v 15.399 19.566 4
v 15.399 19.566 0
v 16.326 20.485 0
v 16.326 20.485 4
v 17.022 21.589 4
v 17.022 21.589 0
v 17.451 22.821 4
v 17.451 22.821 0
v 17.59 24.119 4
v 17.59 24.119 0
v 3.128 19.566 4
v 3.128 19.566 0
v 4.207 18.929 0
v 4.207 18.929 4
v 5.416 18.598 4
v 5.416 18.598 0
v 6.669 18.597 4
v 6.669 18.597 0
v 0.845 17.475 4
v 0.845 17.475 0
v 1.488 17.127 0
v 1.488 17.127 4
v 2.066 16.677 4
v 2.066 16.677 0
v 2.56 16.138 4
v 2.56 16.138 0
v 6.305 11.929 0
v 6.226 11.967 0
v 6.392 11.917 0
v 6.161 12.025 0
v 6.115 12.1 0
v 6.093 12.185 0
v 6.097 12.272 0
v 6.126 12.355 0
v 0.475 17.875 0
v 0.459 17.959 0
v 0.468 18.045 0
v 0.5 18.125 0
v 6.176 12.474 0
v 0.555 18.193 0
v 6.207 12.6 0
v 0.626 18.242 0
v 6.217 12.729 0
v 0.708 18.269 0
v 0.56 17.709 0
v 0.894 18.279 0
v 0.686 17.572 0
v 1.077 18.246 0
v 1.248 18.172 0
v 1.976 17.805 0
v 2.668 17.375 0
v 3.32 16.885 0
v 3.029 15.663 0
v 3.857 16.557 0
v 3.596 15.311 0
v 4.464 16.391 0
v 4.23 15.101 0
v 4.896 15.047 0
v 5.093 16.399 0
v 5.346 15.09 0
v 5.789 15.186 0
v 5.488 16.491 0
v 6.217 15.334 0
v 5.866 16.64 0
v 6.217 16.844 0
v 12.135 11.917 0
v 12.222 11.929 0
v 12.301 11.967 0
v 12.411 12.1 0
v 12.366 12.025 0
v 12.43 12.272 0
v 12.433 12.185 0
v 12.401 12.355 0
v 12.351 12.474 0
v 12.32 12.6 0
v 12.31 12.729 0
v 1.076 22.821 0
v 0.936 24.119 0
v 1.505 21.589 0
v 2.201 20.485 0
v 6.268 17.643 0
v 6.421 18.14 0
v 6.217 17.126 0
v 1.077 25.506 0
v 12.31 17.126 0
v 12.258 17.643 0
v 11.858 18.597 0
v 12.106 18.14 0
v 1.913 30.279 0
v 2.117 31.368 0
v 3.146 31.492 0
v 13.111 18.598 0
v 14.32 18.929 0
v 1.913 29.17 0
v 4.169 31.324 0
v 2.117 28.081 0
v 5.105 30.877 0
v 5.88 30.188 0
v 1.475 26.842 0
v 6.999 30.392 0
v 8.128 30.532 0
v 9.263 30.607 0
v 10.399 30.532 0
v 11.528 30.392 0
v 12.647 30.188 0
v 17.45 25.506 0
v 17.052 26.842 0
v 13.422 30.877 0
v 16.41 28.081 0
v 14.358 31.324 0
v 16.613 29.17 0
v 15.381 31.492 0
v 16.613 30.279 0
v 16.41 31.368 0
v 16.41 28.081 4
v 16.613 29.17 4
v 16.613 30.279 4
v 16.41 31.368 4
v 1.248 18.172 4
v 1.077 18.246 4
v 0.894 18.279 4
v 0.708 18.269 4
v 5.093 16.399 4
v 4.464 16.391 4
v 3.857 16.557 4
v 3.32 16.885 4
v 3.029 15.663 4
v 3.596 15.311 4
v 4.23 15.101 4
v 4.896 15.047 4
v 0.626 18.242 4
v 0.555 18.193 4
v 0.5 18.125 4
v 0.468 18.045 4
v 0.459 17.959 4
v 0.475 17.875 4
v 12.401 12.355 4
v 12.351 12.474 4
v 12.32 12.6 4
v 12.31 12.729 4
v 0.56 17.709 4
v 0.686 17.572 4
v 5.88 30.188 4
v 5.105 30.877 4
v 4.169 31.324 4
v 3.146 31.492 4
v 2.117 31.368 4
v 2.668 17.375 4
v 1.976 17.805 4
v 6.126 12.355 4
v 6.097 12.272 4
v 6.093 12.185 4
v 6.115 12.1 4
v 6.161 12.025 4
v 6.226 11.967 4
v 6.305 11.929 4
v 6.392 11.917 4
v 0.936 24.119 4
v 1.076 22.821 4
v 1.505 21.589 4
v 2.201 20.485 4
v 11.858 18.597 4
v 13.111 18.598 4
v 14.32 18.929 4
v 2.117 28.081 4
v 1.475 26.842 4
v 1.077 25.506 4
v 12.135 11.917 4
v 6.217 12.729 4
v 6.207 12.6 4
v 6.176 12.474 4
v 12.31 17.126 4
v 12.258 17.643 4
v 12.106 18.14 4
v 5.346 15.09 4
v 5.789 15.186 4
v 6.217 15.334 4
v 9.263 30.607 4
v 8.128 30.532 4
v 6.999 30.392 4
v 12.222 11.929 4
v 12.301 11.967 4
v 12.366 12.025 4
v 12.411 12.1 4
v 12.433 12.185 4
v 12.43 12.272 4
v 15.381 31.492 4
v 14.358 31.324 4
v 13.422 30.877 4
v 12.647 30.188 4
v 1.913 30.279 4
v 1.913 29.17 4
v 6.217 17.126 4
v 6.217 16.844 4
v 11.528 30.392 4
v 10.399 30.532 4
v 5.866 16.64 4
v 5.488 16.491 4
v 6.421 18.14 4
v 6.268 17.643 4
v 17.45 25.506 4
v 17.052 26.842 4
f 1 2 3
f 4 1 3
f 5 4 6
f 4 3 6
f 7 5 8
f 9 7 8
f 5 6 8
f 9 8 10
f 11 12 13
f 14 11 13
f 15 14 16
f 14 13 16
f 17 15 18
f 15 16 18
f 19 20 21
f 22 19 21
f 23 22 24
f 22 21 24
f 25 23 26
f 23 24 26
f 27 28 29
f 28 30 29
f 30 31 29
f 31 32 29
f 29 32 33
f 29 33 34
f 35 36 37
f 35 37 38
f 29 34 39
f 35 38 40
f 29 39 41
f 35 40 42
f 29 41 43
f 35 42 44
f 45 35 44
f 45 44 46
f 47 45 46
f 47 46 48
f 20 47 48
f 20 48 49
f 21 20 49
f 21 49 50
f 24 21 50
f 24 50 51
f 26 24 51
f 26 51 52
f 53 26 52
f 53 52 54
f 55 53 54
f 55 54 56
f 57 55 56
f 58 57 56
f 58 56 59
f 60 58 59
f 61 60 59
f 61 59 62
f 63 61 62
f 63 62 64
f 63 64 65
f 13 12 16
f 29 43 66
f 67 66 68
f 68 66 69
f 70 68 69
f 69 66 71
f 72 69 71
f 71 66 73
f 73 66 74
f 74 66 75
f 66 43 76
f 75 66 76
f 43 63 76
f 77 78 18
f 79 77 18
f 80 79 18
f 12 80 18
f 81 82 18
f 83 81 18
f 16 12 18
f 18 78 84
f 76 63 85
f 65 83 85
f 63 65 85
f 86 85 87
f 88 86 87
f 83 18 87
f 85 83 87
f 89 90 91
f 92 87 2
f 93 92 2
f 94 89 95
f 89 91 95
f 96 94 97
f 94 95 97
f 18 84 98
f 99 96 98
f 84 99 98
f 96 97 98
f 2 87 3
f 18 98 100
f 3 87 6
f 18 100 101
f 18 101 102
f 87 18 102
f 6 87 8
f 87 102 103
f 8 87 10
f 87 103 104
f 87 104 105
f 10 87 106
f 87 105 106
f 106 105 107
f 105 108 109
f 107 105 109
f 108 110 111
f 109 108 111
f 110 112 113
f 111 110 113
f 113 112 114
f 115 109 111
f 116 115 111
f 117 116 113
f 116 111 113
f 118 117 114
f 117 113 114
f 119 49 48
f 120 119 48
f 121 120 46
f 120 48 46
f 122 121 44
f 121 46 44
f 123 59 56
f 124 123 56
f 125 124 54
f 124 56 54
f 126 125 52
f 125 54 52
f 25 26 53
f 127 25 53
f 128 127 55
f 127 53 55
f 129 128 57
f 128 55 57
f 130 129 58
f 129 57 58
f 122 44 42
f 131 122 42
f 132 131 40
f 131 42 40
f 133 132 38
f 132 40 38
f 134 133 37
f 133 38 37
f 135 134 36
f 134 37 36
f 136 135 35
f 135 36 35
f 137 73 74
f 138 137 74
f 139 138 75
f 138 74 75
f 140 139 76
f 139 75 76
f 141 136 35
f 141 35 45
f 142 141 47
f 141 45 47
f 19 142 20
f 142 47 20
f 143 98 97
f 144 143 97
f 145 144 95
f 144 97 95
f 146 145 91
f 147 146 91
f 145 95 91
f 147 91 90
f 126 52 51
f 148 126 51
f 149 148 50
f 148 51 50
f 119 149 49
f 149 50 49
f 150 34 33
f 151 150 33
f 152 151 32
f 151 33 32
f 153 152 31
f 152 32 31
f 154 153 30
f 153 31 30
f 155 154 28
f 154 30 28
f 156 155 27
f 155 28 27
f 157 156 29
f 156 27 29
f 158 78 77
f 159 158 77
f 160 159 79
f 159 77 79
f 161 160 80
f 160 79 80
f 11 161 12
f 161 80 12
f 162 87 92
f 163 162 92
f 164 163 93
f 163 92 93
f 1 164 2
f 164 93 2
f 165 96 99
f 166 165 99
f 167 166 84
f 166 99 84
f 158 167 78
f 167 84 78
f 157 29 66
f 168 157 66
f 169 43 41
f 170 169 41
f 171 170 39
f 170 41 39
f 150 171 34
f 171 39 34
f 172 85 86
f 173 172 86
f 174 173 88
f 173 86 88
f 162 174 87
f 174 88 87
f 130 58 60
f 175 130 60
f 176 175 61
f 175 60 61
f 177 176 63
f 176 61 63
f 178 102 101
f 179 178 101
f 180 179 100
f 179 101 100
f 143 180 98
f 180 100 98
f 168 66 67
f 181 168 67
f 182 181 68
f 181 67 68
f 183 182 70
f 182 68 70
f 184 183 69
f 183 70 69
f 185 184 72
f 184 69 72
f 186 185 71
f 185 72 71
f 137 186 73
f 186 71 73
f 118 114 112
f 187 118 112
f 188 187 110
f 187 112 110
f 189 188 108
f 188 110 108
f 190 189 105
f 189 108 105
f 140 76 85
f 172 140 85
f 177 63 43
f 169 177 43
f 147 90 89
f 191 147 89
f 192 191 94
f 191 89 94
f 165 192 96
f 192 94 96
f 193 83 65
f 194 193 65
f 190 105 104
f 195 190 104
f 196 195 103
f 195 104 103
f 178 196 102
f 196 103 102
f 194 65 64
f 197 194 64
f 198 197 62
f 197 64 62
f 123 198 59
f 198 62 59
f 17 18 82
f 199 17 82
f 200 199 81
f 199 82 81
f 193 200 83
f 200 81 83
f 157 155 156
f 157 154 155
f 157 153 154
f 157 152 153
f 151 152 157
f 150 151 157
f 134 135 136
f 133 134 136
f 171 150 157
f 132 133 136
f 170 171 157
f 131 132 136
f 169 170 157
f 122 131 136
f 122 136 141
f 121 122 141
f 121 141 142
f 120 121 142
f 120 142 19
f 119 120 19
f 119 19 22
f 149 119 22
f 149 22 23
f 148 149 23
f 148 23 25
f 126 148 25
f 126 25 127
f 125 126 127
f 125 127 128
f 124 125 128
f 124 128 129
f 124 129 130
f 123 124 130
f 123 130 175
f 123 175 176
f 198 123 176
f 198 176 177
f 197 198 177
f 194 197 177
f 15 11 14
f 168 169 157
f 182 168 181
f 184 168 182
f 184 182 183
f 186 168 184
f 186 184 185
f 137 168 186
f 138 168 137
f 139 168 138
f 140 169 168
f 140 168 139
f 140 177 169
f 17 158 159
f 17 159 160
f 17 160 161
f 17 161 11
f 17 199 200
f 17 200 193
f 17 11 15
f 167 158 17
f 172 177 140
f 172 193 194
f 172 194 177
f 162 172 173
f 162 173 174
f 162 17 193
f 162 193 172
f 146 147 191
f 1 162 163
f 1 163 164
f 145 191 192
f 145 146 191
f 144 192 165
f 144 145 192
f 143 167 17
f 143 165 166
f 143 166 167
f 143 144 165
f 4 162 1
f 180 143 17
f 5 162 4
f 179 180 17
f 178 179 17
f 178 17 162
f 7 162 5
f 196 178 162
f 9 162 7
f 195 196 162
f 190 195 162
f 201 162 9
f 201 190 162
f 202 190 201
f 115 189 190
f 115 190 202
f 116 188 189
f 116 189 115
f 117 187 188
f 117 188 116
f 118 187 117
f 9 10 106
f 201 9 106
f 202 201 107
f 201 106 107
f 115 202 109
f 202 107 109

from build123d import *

# Parameters (mm, degrees)
F1_DEPTH    = 4
F3_DEPTH    = 4
F4_T1_DEPTH = 8.9373301178
F4_T3_DEPTH = 5.4979166118


# Not quite as in the source:
# - a fillet or chamfer that OpenCascade refuses, or shapes differently, is made with other operations: its cross-section is extruded or revolved along the edge and cut away or added


with BuildPart() as f1:
    # F0 (on Top) → F1 (new body)
    with BuildSketch(Plane.XY):
        with BuildLine():
            Line((5.4043182717, 11.9166336954), (9.2633608729, 11.9166336954))
            Line((9.2633608729, 11.9166336954), (13.1224034741, 11.9166336954))
            ThreePointArc((13.1224034741, 11.9166336954), (12.5478266836, 12.1546311946), (12.3098291843, 12.7292079851))
            Line((12.3098291843, 12.7292079851), (12.3098291843, 17.1262745588))
            ThreePointArc((12.3098291843, 17.1262745588), (12.1943632439, 17.8955690891), (11.8581410497, 18.5970682651))
            ThreePointArc((11.8581410497, 18.5970682651), (13.7265197912, 18.7234015951), (15.3986439109, 19.5664912462))
            ThreePointArc((15.3986439109, 19.5664912462), (17.0218223076, 21.5886397467), (17.5903830677, 24.1185668856))
            ThreePointArc((17.5903830677, 24.1185668856), (17.2823984437, 26.1835910199), (16.4102166891, 28.0805565417))
            ThreePointArc((16.4102166891, 28.0805565417), (16.638828313, 29.724361375), (16.4102166891, 31.3681662083))
            ThreePointArc((16.4102166891, 31.3681662083), (14.3575671426, 31.3236587754), (12.6471198819, 30.1879998296))
            ThreePointArc((12.6471198819, 30.1879998296), (10.9641887914, 30.4698973914), (9.2633608729, 30.6074026007))
            ThreePointArc((9.2633608729, 30.6074026007), (7.5625329544, 30.4698973914), (5.8796018638, 30.1879998296))
            ThreePointArc((5.8796018638, 30.1879998296), (4.1691546032, 31.3236587754), (2.1165050566, 31.3681662083))
            ThreePointArc((2.1165050566, 31.3681662083), (1.8878934327, 29.724361375), (2.1165050566, 28.0805565417))
            ThreePointArc((2.1165050566, 28.0805565417), (1.244323302, 26.1835910199), (0.936338678, 24.1185668856))
            ThreePointArc((0.936338678, 24.1185668856), (1.5048994381, 21.5886397467), (3.1280778348, 19.5664912462))
            ThreePointArc((3.1280778348, 19.5664912462), (4.8002019546, 18.7234015951), (6.668580696, 18.5970682651))
            ThreePointArc((6.668580696, 18.5970682651), (6.3323585018, 17.8955690891), (6.2168925614, 17.1262745588))
            Line((6.2168925614, 17.1262745588), (6.2168925614, 12.7292079851))
            ThreePointArc((6.2168925614, 12.7292079851), (5.9788950622, 12.1546311946), (5.4043182717, 11.9166336954))
        make_face()
    extrude(amount=F1_DEPTH)

    # F2 (on Top) → F3 (join, through all)
    with BuildSketch(Plane.XY):
        with BuildLine():
            ThreePointArc((6.2168925614, 16.8439224371), (5.6798309181, 16.5586654348), (5.0929421559, 16.3993909955))
            ThreePointArc((5.0929421559, 16.3993909955), (4.1545493311, 16.4529754412), (3.3199274912, 16.8852470815))
            ThreePointArc((3.3199274912, 16.8852470815), (2.3265556072, 17.5975106191), (1.2477898737, 18.1722901762))
            ThreePointArc((1.2477898737, 18.1722901762), (0.8448717213, 18.2802980548), (0.441953569, 18.1722901762))
            ThreePointArc((0.441953569, 18.1722901762), (0.5289468082, 17.7574058892), (0.8448717213, 17.4747608034))
            ThreePointArc((0.8448717213, 17.4747608034), (1.7862867621, 16.9138981945), (2.5603426512, 16.1382264689))
            ThreePointArc((2.5603426512, 16.1382264689), (3.5961993789, 15.3105799436), (4.8955686661, 15.0466909773))
            ThreePointArc((4.8955686661, 15.0466909773), (5.5689958467, 15.1314623043), (6.2168925614, 15.3337497048))
            Line((6.2168925614, 15.3337497048), (6.2168925614, 16.8439224371))
        make_face()
    extrude(amount=F3_DEPTH)

    # F4: fillet of radius 0.3 on 3 edges, made by hand

    # F4_s2 → F4_t1 (cut)
    with BuildSketch(Plane.XY.offset(-2.4686650589)):
        with BuildLine():
            ThreePointArc((12.1349374505, 11.9166336954), (12.3913198946, 12.0608516606), (12.4012026427, 12.3548467462))
            ThreePointArc((12.4012026427, 12.3548467462), (12.7004552198, 12.0347753771), (13.1224034741, 11.9166336954))
            Line((13.1224034741, 11.9166336954), (12.1349374505, 11.9166336954))
        make_face()
        with BuildLine():
            ThreePointArc((6.1255191031, 12.3548467462), (6.1354018511, 12.0608516606), (6.3917842952, 11.9166336954))
            Line((6.3917842952, 11.9166336954), (5.4043182717, 11.9166336954))
            ThreePointArc((5.4043182717, 11.9166336954), (5.8262665259, 12.0347753771), (6.1255191031, 12.3548467462))
        make_face()
    extrude(amount=F4_T1_DEPTH, mode=Mode.SUBTRACT)

    # F4_s4 → F4_t3 (cut)
    with BuildSketch(Plane.XY.offset(-0.7489583059)):
        with BuildLine():
            ThreePointArc((0.7077089455, 18.2685344716), (0.5003837706, 18.1253146023), (0.4753670818, 17.8745760445))
            ThreePointArc((0.4753670818, 17.8745760445), (0.4420534576, 18.0215692627), (0.441953569, 18.1722901762))
            ThreePointArc((0.441953569, 18.1722901762), (0.5705770014, 18.2321594237), (0.7077089455, 18.2685344716))
        make_face()
    extrude(amount=F4_T3_DEPTH, mode=Mode.SUBTRACT)


solid = f1.part
